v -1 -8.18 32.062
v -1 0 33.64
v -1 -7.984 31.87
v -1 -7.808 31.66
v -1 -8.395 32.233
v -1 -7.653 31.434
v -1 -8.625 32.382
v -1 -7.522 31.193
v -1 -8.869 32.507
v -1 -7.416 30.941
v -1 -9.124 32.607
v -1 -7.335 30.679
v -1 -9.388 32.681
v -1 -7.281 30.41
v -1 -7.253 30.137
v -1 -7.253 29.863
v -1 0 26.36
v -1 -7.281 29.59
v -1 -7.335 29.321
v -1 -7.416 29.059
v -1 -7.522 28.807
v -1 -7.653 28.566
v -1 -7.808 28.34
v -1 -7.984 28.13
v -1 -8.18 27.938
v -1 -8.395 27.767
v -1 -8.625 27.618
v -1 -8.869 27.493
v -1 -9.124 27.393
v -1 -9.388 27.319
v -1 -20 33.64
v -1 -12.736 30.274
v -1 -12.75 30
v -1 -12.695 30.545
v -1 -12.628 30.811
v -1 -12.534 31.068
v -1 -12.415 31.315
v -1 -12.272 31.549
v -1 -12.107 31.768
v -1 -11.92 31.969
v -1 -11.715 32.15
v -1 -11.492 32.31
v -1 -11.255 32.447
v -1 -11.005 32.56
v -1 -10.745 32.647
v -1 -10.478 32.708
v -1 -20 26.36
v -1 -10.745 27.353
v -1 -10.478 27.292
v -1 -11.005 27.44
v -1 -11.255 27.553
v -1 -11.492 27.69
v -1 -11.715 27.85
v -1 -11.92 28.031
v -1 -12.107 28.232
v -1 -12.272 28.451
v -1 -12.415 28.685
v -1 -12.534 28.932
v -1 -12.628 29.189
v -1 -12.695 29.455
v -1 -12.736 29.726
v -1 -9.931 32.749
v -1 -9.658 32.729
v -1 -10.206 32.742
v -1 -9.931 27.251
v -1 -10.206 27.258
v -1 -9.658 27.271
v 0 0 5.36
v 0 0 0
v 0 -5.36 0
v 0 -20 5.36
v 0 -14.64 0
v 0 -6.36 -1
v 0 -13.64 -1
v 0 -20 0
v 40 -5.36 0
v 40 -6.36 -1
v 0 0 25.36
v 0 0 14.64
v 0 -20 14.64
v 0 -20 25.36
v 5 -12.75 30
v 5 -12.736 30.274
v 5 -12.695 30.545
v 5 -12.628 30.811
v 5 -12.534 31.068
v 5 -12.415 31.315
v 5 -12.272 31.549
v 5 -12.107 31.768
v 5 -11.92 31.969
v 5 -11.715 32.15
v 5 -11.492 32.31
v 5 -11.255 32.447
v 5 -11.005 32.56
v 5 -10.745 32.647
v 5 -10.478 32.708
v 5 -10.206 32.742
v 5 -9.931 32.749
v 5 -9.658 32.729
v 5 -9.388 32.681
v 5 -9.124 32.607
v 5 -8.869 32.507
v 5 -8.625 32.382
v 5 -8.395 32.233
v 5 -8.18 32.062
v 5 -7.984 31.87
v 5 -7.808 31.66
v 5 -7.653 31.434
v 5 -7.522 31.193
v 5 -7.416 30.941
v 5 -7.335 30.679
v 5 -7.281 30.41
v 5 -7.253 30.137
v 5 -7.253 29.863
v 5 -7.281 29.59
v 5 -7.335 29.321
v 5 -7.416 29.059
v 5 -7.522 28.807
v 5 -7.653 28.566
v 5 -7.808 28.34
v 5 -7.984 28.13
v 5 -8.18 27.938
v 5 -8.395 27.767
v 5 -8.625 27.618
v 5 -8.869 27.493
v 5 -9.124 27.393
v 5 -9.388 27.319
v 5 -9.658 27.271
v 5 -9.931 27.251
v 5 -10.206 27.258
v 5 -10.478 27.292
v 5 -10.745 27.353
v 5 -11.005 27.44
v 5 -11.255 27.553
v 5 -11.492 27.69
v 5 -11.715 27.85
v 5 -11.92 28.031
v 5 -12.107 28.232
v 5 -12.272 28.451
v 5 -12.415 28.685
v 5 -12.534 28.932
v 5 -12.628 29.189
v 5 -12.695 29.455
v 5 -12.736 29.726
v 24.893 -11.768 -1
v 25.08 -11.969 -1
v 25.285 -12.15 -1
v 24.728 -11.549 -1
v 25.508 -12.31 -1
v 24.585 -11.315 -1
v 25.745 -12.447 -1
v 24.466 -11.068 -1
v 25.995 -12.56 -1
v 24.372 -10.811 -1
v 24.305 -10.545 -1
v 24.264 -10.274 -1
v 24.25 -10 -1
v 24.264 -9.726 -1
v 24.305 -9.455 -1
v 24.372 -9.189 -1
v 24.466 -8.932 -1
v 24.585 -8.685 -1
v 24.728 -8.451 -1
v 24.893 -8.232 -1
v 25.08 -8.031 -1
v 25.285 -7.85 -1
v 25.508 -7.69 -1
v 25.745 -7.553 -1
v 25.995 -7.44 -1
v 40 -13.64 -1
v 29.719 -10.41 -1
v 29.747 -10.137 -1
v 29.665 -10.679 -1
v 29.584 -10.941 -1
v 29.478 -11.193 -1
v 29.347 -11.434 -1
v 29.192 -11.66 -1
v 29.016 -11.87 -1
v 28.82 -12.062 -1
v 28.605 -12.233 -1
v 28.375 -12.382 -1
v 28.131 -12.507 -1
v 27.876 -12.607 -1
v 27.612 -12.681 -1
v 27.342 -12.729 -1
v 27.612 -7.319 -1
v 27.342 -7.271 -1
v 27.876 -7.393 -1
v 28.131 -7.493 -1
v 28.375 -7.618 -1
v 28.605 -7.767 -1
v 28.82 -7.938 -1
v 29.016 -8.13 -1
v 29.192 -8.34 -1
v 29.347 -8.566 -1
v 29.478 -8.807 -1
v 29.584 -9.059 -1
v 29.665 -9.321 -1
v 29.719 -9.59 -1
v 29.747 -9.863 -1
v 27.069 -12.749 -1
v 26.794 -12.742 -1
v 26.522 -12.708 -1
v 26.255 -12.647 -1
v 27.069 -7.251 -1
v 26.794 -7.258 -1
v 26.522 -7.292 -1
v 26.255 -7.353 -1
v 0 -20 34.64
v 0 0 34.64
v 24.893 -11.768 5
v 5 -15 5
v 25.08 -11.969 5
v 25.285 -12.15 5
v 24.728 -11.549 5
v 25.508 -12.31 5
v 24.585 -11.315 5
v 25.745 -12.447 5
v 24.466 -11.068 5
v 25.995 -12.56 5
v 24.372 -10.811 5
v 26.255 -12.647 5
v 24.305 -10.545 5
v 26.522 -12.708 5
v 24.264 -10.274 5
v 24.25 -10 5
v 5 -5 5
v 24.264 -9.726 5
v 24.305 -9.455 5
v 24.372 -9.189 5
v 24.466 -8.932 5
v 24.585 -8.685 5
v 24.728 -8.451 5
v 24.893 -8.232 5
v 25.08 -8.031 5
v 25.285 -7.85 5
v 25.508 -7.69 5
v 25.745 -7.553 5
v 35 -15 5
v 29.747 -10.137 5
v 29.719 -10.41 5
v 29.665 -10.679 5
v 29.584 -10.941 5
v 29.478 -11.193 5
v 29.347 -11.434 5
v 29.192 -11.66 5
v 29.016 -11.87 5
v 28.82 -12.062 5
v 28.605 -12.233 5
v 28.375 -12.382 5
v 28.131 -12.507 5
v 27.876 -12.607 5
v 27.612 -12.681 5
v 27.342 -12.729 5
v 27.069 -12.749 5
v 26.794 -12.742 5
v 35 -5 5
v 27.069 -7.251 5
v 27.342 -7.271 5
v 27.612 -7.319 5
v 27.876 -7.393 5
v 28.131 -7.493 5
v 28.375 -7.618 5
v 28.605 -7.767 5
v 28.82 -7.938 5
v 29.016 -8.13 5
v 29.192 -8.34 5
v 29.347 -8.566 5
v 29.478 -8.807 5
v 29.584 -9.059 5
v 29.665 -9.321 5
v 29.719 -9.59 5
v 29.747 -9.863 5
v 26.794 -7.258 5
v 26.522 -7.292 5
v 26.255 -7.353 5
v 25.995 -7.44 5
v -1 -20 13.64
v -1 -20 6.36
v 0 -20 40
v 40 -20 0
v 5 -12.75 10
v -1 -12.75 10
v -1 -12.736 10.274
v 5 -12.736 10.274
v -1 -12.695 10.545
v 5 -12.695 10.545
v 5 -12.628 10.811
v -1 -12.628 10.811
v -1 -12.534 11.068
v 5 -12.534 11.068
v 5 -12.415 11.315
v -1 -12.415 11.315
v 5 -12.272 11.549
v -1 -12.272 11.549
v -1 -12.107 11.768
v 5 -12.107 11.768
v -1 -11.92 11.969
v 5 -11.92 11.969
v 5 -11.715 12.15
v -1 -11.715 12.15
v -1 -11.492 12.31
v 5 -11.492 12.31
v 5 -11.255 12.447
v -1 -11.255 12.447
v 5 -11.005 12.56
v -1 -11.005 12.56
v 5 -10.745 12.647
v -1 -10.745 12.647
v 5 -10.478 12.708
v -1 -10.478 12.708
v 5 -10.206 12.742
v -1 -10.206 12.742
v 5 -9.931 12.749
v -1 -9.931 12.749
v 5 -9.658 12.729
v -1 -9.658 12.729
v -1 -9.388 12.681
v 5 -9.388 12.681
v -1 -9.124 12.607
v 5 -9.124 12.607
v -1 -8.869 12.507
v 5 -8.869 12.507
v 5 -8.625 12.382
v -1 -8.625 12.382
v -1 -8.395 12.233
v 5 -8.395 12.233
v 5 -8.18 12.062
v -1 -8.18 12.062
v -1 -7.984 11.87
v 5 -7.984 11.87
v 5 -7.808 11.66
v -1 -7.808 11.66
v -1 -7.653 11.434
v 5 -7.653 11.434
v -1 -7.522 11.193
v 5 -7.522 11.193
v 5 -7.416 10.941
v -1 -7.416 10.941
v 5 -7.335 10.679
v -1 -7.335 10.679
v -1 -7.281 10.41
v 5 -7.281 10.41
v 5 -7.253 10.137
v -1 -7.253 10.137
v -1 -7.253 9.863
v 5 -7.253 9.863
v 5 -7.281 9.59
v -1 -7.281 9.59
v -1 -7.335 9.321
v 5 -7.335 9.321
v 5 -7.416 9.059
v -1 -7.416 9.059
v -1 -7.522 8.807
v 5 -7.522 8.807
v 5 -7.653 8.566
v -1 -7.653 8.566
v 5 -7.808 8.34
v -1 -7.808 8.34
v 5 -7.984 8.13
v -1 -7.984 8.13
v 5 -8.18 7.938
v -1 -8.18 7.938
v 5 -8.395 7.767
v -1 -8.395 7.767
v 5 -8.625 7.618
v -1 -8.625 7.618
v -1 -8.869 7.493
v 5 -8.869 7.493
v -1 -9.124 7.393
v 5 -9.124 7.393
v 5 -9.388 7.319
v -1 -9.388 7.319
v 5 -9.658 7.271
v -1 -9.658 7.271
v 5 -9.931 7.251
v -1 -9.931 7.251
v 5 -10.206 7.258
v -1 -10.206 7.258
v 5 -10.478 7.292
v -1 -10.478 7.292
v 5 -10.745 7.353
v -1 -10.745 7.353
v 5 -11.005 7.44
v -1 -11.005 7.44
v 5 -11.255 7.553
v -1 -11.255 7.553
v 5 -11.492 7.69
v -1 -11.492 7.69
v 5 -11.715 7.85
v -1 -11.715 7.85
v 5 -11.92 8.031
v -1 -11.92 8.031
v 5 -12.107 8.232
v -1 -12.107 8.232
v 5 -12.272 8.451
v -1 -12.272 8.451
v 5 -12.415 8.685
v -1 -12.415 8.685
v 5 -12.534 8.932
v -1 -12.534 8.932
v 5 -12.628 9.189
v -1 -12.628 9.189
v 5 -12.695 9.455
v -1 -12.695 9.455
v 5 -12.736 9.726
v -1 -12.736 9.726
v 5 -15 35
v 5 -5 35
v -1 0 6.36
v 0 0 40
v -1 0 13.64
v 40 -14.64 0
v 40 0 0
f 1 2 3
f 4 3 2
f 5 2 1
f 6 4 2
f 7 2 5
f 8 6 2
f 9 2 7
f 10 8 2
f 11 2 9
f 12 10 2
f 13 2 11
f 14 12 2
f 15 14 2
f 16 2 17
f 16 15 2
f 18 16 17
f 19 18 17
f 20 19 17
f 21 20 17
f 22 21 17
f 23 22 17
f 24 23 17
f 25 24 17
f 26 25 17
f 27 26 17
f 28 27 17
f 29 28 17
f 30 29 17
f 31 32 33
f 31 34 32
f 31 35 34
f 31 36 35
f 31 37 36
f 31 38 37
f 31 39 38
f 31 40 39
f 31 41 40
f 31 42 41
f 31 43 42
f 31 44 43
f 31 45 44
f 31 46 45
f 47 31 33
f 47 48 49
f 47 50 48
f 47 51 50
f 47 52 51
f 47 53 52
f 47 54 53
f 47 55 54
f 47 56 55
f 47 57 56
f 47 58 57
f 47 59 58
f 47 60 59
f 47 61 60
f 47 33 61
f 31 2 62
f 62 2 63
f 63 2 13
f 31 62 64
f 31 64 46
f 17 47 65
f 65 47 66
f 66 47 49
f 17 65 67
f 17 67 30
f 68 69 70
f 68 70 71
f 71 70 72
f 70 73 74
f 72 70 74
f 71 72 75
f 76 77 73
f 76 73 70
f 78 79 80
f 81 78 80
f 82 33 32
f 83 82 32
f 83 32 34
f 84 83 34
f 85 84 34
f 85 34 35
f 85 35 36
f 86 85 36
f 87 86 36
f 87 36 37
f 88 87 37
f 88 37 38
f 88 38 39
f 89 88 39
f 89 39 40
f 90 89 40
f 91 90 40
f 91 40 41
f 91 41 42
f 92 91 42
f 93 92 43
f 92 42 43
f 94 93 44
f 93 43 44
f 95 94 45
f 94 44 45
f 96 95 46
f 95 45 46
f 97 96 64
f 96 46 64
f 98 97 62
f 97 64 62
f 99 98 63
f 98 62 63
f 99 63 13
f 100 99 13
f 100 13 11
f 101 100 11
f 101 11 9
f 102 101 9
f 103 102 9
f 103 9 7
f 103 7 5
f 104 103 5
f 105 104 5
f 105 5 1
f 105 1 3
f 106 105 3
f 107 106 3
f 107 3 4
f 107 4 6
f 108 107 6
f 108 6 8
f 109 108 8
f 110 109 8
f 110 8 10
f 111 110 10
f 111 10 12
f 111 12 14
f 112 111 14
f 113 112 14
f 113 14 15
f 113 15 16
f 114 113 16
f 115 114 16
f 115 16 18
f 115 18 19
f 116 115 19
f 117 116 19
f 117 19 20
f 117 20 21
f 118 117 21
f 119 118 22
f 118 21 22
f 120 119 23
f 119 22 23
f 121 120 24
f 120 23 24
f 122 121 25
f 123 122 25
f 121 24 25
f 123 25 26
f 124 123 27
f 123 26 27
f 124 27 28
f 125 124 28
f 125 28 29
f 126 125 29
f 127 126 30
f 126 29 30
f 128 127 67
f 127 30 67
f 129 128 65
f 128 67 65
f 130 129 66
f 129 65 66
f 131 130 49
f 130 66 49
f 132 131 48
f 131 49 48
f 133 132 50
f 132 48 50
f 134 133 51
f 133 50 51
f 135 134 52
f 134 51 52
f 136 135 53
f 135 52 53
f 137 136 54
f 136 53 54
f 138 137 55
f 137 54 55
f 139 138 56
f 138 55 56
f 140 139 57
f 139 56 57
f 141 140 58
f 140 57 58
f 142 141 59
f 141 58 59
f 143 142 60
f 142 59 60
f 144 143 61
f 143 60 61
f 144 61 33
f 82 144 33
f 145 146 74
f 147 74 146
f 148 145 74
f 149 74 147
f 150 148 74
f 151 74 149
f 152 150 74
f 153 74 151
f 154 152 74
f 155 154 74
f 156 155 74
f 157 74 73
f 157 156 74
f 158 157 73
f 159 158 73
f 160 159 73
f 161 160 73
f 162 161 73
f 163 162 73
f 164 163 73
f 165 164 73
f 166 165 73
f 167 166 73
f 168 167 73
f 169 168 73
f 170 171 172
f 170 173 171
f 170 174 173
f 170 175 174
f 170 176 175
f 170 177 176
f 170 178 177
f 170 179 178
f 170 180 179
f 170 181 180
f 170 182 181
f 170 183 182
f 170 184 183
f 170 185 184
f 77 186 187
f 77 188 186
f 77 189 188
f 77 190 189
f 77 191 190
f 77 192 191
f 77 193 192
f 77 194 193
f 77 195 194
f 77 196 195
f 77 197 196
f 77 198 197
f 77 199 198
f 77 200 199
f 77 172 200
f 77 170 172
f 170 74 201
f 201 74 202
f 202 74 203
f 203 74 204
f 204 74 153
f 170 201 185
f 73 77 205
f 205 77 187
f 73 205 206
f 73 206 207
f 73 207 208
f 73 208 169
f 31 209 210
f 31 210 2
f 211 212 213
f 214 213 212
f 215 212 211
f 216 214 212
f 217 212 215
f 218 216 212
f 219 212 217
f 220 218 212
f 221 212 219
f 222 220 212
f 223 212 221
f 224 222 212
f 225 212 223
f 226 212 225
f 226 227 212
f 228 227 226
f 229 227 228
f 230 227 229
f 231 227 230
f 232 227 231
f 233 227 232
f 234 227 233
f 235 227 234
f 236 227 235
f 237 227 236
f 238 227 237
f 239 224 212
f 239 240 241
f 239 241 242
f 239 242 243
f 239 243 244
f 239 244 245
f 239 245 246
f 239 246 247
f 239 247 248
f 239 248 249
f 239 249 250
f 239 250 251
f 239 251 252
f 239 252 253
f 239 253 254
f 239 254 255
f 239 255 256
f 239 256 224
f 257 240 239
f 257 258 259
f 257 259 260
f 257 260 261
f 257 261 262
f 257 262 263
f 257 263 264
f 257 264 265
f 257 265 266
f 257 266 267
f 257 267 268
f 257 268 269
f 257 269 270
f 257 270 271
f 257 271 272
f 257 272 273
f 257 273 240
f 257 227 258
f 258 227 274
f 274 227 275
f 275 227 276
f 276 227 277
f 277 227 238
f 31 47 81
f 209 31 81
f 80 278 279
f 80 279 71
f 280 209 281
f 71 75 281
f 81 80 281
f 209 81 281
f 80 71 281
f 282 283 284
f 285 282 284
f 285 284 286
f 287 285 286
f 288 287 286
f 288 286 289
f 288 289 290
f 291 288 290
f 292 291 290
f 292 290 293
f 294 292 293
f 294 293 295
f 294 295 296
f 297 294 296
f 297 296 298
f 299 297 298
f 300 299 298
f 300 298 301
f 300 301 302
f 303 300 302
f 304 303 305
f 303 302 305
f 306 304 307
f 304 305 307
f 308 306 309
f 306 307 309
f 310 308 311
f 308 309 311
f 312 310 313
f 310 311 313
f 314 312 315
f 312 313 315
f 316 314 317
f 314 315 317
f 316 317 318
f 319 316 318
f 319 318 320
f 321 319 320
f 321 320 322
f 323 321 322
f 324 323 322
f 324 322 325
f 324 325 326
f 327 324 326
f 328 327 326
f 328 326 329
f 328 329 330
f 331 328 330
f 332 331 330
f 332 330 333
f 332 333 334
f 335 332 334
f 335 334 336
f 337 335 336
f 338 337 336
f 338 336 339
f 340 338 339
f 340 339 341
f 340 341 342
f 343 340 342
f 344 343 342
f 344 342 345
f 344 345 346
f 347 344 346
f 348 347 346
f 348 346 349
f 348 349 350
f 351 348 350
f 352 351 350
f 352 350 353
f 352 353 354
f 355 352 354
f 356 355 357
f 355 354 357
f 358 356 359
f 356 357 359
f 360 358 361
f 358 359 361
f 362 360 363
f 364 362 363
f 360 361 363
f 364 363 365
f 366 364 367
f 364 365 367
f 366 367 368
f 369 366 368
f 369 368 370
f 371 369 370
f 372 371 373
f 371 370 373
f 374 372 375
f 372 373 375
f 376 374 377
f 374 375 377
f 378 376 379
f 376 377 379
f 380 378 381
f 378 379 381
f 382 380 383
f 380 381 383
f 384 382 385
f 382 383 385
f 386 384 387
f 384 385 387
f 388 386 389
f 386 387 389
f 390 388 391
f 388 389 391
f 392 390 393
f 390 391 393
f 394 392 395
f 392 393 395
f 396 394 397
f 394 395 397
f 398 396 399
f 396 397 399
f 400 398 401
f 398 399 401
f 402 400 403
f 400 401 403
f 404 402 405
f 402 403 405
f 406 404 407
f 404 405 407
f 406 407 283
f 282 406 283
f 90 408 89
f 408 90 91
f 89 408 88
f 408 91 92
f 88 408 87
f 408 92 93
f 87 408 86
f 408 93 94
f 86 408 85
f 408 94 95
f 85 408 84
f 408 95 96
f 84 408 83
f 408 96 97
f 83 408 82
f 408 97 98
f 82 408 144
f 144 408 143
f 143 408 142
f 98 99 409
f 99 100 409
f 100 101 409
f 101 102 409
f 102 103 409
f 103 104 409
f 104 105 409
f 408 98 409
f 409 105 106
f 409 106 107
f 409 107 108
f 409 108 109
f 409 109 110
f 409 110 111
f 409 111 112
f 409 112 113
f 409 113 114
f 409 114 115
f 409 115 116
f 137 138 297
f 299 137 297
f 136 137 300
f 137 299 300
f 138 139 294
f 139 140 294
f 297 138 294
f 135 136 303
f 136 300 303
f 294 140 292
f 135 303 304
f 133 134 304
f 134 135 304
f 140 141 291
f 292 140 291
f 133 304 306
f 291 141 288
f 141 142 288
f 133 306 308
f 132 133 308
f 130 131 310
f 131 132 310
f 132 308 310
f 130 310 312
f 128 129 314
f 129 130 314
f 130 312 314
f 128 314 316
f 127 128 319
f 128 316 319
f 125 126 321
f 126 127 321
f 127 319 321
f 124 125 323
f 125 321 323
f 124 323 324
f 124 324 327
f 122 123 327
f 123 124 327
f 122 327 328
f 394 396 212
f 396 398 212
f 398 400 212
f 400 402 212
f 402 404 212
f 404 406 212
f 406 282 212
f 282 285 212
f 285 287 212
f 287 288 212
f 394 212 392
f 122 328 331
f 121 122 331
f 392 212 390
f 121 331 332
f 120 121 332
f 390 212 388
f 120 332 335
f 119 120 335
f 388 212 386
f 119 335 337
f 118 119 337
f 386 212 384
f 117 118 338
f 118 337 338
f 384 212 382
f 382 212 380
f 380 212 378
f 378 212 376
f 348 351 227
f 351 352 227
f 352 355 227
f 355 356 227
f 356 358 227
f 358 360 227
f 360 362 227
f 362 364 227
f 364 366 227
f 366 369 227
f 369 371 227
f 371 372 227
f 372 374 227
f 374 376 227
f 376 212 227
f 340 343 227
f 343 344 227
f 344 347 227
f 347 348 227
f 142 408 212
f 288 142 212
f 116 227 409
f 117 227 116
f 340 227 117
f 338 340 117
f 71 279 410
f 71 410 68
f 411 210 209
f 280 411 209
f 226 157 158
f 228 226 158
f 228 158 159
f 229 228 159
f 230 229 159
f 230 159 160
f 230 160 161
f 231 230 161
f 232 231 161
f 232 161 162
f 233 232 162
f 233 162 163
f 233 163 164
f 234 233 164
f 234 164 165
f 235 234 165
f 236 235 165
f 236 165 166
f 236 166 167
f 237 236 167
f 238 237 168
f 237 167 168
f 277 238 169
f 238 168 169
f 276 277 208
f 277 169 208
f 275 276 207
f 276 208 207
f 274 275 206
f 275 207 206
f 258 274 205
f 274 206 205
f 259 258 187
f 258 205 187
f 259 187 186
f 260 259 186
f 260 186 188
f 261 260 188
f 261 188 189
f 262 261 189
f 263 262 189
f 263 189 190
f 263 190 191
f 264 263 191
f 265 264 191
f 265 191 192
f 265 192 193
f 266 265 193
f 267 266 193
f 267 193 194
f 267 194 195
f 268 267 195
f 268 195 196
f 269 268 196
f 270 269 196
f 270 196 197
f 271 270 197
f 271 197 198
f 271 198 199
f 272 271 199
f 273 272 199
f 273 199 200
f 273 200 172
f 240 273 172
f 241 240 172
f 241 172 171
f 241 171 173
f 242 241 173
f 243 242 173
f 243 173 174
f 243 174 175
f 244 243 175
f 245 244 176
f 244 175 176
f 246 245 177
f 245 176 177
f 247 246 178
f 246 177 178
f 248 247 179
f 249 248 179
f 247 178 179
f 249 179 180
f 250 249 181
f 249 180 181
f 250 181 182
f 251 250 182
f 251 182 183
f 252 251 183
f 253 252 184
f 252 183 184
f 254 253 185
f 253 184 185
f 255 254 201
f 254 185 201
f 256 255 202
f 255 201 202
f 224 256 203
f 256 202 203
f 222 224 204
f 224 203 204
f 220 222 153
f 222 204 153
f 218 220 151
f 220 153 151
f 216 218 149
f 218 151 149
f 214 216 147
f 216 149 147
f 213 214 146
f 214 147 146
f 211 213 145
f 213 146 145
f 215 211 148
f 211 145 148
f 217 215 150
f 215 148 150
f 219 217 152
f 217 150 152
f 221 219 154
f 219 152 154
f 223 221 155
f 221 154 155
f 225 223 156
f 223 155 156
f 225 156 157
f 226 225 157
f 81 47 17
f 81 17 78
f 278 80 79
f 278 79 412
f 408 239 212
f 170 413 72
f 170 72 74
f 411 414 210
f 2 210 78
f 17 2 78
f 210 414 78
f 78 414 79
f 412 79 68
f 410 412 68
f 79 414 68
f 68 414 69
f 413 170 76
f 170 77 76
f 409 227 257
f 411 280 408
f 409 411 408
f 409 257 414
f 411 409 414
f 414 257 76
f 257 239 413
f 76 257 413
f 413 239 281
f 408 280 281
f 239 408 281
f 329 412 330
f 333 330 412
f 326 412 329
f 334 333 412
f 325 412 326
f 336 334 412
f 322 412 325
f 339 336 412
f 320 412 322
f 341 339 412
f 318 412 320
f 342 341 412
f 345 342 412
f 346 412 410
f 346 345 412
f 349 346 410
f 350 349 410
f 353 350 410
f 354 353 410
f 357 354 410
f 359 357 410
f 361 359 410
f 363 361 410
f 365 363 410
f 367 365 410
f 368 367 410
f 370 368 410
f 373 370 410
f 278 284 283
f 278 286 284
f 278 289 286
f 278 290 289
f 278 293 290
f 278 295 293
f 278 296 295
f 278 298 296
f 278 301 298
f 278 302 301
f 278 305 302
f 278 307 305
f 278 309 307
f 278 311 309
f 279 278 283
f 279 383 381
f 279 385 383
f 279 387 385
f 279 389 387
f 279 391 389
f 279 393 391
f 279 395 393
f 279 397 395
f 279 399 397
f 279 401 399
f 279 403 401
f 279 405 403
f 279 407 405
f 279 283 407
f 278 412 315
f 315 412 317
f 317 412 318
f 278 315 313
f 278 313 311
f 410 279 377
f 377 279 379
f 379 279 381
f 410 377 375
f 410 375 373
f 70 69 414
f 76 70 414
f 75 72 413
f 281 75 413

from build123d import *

# Parameters (mm, degrees)
F0_W         = 40
F0_H         = 20
F1_DEPTH     = 5
F3_DEPTH     = 35
F5_DEPTH     = 40
F7_DEPTH     = 20.001
F9_DEPTH     = 20
F12_D        = 5.5
F12_ON_F11_D = 5.5


with BuildPart() as f1:
    # F0 (on Top) → F1 (new body)
    with BuildSketch(Plane.XY):
        with Locations((20, -10)):
            Rectangle(F0_W, F0_H)
    extrude(amount=F1_DEPTH)

    # F2 (on face) → F3 (join)
    with BuildSketch(Plane.XY.offset(5)):
        Polygon((0, -20), (40, -20), (40, -15), (5, -15), (5, -5), (40, -5), (40, 0), (0, 0), align=None)
    extrude(amount=F3_DEPTH)

    # F4 (on face) → F5 (join, through all)
    with BuildSketch(Plane.YZ.offset(40)):
        Polygon((-5.36, 0), (-14.64, 0), (-13.64, -1), (-6.36, -1), align=None)
    extrude(amount=-F5_DEPTH)

    # F6 (on face) → F7 (cut, through all)
    with BuildSketch(Plane.XZ.offset(20)):
        Polygon((40, 40), (0, 40), (40, 0), align=None)
    extrude(amount=-F7_DEPTH, mode=Mode.SUBTRACT)

    # F8 (on face) → F9 (join, through all)
    with BuildSketch(Plane.XZ.offset(20)):
        Polygon((0, 25.36), (0, 34.64), (-1, 33.64), (-1, 26.36), align=None)
        Polygon((0, 5.36), (0, 14.64), (-1, 13.64), (-1, 6.36), align=None)
    extrude(amount=-F9_DEPTH)

    # F12 (through all)
    with Locations(Plane.YZ.offset(5)):
        with Locations((-10, 30), (-10, 10)):
            Hole(F12_D / 2)

    # F12 on F11 (through all)
    with Locations(Plane.XY.offset(5)):
        with Locations((27, -10)):
            Hole(F12_ON_F11_D / 2)


solid = f1.part
